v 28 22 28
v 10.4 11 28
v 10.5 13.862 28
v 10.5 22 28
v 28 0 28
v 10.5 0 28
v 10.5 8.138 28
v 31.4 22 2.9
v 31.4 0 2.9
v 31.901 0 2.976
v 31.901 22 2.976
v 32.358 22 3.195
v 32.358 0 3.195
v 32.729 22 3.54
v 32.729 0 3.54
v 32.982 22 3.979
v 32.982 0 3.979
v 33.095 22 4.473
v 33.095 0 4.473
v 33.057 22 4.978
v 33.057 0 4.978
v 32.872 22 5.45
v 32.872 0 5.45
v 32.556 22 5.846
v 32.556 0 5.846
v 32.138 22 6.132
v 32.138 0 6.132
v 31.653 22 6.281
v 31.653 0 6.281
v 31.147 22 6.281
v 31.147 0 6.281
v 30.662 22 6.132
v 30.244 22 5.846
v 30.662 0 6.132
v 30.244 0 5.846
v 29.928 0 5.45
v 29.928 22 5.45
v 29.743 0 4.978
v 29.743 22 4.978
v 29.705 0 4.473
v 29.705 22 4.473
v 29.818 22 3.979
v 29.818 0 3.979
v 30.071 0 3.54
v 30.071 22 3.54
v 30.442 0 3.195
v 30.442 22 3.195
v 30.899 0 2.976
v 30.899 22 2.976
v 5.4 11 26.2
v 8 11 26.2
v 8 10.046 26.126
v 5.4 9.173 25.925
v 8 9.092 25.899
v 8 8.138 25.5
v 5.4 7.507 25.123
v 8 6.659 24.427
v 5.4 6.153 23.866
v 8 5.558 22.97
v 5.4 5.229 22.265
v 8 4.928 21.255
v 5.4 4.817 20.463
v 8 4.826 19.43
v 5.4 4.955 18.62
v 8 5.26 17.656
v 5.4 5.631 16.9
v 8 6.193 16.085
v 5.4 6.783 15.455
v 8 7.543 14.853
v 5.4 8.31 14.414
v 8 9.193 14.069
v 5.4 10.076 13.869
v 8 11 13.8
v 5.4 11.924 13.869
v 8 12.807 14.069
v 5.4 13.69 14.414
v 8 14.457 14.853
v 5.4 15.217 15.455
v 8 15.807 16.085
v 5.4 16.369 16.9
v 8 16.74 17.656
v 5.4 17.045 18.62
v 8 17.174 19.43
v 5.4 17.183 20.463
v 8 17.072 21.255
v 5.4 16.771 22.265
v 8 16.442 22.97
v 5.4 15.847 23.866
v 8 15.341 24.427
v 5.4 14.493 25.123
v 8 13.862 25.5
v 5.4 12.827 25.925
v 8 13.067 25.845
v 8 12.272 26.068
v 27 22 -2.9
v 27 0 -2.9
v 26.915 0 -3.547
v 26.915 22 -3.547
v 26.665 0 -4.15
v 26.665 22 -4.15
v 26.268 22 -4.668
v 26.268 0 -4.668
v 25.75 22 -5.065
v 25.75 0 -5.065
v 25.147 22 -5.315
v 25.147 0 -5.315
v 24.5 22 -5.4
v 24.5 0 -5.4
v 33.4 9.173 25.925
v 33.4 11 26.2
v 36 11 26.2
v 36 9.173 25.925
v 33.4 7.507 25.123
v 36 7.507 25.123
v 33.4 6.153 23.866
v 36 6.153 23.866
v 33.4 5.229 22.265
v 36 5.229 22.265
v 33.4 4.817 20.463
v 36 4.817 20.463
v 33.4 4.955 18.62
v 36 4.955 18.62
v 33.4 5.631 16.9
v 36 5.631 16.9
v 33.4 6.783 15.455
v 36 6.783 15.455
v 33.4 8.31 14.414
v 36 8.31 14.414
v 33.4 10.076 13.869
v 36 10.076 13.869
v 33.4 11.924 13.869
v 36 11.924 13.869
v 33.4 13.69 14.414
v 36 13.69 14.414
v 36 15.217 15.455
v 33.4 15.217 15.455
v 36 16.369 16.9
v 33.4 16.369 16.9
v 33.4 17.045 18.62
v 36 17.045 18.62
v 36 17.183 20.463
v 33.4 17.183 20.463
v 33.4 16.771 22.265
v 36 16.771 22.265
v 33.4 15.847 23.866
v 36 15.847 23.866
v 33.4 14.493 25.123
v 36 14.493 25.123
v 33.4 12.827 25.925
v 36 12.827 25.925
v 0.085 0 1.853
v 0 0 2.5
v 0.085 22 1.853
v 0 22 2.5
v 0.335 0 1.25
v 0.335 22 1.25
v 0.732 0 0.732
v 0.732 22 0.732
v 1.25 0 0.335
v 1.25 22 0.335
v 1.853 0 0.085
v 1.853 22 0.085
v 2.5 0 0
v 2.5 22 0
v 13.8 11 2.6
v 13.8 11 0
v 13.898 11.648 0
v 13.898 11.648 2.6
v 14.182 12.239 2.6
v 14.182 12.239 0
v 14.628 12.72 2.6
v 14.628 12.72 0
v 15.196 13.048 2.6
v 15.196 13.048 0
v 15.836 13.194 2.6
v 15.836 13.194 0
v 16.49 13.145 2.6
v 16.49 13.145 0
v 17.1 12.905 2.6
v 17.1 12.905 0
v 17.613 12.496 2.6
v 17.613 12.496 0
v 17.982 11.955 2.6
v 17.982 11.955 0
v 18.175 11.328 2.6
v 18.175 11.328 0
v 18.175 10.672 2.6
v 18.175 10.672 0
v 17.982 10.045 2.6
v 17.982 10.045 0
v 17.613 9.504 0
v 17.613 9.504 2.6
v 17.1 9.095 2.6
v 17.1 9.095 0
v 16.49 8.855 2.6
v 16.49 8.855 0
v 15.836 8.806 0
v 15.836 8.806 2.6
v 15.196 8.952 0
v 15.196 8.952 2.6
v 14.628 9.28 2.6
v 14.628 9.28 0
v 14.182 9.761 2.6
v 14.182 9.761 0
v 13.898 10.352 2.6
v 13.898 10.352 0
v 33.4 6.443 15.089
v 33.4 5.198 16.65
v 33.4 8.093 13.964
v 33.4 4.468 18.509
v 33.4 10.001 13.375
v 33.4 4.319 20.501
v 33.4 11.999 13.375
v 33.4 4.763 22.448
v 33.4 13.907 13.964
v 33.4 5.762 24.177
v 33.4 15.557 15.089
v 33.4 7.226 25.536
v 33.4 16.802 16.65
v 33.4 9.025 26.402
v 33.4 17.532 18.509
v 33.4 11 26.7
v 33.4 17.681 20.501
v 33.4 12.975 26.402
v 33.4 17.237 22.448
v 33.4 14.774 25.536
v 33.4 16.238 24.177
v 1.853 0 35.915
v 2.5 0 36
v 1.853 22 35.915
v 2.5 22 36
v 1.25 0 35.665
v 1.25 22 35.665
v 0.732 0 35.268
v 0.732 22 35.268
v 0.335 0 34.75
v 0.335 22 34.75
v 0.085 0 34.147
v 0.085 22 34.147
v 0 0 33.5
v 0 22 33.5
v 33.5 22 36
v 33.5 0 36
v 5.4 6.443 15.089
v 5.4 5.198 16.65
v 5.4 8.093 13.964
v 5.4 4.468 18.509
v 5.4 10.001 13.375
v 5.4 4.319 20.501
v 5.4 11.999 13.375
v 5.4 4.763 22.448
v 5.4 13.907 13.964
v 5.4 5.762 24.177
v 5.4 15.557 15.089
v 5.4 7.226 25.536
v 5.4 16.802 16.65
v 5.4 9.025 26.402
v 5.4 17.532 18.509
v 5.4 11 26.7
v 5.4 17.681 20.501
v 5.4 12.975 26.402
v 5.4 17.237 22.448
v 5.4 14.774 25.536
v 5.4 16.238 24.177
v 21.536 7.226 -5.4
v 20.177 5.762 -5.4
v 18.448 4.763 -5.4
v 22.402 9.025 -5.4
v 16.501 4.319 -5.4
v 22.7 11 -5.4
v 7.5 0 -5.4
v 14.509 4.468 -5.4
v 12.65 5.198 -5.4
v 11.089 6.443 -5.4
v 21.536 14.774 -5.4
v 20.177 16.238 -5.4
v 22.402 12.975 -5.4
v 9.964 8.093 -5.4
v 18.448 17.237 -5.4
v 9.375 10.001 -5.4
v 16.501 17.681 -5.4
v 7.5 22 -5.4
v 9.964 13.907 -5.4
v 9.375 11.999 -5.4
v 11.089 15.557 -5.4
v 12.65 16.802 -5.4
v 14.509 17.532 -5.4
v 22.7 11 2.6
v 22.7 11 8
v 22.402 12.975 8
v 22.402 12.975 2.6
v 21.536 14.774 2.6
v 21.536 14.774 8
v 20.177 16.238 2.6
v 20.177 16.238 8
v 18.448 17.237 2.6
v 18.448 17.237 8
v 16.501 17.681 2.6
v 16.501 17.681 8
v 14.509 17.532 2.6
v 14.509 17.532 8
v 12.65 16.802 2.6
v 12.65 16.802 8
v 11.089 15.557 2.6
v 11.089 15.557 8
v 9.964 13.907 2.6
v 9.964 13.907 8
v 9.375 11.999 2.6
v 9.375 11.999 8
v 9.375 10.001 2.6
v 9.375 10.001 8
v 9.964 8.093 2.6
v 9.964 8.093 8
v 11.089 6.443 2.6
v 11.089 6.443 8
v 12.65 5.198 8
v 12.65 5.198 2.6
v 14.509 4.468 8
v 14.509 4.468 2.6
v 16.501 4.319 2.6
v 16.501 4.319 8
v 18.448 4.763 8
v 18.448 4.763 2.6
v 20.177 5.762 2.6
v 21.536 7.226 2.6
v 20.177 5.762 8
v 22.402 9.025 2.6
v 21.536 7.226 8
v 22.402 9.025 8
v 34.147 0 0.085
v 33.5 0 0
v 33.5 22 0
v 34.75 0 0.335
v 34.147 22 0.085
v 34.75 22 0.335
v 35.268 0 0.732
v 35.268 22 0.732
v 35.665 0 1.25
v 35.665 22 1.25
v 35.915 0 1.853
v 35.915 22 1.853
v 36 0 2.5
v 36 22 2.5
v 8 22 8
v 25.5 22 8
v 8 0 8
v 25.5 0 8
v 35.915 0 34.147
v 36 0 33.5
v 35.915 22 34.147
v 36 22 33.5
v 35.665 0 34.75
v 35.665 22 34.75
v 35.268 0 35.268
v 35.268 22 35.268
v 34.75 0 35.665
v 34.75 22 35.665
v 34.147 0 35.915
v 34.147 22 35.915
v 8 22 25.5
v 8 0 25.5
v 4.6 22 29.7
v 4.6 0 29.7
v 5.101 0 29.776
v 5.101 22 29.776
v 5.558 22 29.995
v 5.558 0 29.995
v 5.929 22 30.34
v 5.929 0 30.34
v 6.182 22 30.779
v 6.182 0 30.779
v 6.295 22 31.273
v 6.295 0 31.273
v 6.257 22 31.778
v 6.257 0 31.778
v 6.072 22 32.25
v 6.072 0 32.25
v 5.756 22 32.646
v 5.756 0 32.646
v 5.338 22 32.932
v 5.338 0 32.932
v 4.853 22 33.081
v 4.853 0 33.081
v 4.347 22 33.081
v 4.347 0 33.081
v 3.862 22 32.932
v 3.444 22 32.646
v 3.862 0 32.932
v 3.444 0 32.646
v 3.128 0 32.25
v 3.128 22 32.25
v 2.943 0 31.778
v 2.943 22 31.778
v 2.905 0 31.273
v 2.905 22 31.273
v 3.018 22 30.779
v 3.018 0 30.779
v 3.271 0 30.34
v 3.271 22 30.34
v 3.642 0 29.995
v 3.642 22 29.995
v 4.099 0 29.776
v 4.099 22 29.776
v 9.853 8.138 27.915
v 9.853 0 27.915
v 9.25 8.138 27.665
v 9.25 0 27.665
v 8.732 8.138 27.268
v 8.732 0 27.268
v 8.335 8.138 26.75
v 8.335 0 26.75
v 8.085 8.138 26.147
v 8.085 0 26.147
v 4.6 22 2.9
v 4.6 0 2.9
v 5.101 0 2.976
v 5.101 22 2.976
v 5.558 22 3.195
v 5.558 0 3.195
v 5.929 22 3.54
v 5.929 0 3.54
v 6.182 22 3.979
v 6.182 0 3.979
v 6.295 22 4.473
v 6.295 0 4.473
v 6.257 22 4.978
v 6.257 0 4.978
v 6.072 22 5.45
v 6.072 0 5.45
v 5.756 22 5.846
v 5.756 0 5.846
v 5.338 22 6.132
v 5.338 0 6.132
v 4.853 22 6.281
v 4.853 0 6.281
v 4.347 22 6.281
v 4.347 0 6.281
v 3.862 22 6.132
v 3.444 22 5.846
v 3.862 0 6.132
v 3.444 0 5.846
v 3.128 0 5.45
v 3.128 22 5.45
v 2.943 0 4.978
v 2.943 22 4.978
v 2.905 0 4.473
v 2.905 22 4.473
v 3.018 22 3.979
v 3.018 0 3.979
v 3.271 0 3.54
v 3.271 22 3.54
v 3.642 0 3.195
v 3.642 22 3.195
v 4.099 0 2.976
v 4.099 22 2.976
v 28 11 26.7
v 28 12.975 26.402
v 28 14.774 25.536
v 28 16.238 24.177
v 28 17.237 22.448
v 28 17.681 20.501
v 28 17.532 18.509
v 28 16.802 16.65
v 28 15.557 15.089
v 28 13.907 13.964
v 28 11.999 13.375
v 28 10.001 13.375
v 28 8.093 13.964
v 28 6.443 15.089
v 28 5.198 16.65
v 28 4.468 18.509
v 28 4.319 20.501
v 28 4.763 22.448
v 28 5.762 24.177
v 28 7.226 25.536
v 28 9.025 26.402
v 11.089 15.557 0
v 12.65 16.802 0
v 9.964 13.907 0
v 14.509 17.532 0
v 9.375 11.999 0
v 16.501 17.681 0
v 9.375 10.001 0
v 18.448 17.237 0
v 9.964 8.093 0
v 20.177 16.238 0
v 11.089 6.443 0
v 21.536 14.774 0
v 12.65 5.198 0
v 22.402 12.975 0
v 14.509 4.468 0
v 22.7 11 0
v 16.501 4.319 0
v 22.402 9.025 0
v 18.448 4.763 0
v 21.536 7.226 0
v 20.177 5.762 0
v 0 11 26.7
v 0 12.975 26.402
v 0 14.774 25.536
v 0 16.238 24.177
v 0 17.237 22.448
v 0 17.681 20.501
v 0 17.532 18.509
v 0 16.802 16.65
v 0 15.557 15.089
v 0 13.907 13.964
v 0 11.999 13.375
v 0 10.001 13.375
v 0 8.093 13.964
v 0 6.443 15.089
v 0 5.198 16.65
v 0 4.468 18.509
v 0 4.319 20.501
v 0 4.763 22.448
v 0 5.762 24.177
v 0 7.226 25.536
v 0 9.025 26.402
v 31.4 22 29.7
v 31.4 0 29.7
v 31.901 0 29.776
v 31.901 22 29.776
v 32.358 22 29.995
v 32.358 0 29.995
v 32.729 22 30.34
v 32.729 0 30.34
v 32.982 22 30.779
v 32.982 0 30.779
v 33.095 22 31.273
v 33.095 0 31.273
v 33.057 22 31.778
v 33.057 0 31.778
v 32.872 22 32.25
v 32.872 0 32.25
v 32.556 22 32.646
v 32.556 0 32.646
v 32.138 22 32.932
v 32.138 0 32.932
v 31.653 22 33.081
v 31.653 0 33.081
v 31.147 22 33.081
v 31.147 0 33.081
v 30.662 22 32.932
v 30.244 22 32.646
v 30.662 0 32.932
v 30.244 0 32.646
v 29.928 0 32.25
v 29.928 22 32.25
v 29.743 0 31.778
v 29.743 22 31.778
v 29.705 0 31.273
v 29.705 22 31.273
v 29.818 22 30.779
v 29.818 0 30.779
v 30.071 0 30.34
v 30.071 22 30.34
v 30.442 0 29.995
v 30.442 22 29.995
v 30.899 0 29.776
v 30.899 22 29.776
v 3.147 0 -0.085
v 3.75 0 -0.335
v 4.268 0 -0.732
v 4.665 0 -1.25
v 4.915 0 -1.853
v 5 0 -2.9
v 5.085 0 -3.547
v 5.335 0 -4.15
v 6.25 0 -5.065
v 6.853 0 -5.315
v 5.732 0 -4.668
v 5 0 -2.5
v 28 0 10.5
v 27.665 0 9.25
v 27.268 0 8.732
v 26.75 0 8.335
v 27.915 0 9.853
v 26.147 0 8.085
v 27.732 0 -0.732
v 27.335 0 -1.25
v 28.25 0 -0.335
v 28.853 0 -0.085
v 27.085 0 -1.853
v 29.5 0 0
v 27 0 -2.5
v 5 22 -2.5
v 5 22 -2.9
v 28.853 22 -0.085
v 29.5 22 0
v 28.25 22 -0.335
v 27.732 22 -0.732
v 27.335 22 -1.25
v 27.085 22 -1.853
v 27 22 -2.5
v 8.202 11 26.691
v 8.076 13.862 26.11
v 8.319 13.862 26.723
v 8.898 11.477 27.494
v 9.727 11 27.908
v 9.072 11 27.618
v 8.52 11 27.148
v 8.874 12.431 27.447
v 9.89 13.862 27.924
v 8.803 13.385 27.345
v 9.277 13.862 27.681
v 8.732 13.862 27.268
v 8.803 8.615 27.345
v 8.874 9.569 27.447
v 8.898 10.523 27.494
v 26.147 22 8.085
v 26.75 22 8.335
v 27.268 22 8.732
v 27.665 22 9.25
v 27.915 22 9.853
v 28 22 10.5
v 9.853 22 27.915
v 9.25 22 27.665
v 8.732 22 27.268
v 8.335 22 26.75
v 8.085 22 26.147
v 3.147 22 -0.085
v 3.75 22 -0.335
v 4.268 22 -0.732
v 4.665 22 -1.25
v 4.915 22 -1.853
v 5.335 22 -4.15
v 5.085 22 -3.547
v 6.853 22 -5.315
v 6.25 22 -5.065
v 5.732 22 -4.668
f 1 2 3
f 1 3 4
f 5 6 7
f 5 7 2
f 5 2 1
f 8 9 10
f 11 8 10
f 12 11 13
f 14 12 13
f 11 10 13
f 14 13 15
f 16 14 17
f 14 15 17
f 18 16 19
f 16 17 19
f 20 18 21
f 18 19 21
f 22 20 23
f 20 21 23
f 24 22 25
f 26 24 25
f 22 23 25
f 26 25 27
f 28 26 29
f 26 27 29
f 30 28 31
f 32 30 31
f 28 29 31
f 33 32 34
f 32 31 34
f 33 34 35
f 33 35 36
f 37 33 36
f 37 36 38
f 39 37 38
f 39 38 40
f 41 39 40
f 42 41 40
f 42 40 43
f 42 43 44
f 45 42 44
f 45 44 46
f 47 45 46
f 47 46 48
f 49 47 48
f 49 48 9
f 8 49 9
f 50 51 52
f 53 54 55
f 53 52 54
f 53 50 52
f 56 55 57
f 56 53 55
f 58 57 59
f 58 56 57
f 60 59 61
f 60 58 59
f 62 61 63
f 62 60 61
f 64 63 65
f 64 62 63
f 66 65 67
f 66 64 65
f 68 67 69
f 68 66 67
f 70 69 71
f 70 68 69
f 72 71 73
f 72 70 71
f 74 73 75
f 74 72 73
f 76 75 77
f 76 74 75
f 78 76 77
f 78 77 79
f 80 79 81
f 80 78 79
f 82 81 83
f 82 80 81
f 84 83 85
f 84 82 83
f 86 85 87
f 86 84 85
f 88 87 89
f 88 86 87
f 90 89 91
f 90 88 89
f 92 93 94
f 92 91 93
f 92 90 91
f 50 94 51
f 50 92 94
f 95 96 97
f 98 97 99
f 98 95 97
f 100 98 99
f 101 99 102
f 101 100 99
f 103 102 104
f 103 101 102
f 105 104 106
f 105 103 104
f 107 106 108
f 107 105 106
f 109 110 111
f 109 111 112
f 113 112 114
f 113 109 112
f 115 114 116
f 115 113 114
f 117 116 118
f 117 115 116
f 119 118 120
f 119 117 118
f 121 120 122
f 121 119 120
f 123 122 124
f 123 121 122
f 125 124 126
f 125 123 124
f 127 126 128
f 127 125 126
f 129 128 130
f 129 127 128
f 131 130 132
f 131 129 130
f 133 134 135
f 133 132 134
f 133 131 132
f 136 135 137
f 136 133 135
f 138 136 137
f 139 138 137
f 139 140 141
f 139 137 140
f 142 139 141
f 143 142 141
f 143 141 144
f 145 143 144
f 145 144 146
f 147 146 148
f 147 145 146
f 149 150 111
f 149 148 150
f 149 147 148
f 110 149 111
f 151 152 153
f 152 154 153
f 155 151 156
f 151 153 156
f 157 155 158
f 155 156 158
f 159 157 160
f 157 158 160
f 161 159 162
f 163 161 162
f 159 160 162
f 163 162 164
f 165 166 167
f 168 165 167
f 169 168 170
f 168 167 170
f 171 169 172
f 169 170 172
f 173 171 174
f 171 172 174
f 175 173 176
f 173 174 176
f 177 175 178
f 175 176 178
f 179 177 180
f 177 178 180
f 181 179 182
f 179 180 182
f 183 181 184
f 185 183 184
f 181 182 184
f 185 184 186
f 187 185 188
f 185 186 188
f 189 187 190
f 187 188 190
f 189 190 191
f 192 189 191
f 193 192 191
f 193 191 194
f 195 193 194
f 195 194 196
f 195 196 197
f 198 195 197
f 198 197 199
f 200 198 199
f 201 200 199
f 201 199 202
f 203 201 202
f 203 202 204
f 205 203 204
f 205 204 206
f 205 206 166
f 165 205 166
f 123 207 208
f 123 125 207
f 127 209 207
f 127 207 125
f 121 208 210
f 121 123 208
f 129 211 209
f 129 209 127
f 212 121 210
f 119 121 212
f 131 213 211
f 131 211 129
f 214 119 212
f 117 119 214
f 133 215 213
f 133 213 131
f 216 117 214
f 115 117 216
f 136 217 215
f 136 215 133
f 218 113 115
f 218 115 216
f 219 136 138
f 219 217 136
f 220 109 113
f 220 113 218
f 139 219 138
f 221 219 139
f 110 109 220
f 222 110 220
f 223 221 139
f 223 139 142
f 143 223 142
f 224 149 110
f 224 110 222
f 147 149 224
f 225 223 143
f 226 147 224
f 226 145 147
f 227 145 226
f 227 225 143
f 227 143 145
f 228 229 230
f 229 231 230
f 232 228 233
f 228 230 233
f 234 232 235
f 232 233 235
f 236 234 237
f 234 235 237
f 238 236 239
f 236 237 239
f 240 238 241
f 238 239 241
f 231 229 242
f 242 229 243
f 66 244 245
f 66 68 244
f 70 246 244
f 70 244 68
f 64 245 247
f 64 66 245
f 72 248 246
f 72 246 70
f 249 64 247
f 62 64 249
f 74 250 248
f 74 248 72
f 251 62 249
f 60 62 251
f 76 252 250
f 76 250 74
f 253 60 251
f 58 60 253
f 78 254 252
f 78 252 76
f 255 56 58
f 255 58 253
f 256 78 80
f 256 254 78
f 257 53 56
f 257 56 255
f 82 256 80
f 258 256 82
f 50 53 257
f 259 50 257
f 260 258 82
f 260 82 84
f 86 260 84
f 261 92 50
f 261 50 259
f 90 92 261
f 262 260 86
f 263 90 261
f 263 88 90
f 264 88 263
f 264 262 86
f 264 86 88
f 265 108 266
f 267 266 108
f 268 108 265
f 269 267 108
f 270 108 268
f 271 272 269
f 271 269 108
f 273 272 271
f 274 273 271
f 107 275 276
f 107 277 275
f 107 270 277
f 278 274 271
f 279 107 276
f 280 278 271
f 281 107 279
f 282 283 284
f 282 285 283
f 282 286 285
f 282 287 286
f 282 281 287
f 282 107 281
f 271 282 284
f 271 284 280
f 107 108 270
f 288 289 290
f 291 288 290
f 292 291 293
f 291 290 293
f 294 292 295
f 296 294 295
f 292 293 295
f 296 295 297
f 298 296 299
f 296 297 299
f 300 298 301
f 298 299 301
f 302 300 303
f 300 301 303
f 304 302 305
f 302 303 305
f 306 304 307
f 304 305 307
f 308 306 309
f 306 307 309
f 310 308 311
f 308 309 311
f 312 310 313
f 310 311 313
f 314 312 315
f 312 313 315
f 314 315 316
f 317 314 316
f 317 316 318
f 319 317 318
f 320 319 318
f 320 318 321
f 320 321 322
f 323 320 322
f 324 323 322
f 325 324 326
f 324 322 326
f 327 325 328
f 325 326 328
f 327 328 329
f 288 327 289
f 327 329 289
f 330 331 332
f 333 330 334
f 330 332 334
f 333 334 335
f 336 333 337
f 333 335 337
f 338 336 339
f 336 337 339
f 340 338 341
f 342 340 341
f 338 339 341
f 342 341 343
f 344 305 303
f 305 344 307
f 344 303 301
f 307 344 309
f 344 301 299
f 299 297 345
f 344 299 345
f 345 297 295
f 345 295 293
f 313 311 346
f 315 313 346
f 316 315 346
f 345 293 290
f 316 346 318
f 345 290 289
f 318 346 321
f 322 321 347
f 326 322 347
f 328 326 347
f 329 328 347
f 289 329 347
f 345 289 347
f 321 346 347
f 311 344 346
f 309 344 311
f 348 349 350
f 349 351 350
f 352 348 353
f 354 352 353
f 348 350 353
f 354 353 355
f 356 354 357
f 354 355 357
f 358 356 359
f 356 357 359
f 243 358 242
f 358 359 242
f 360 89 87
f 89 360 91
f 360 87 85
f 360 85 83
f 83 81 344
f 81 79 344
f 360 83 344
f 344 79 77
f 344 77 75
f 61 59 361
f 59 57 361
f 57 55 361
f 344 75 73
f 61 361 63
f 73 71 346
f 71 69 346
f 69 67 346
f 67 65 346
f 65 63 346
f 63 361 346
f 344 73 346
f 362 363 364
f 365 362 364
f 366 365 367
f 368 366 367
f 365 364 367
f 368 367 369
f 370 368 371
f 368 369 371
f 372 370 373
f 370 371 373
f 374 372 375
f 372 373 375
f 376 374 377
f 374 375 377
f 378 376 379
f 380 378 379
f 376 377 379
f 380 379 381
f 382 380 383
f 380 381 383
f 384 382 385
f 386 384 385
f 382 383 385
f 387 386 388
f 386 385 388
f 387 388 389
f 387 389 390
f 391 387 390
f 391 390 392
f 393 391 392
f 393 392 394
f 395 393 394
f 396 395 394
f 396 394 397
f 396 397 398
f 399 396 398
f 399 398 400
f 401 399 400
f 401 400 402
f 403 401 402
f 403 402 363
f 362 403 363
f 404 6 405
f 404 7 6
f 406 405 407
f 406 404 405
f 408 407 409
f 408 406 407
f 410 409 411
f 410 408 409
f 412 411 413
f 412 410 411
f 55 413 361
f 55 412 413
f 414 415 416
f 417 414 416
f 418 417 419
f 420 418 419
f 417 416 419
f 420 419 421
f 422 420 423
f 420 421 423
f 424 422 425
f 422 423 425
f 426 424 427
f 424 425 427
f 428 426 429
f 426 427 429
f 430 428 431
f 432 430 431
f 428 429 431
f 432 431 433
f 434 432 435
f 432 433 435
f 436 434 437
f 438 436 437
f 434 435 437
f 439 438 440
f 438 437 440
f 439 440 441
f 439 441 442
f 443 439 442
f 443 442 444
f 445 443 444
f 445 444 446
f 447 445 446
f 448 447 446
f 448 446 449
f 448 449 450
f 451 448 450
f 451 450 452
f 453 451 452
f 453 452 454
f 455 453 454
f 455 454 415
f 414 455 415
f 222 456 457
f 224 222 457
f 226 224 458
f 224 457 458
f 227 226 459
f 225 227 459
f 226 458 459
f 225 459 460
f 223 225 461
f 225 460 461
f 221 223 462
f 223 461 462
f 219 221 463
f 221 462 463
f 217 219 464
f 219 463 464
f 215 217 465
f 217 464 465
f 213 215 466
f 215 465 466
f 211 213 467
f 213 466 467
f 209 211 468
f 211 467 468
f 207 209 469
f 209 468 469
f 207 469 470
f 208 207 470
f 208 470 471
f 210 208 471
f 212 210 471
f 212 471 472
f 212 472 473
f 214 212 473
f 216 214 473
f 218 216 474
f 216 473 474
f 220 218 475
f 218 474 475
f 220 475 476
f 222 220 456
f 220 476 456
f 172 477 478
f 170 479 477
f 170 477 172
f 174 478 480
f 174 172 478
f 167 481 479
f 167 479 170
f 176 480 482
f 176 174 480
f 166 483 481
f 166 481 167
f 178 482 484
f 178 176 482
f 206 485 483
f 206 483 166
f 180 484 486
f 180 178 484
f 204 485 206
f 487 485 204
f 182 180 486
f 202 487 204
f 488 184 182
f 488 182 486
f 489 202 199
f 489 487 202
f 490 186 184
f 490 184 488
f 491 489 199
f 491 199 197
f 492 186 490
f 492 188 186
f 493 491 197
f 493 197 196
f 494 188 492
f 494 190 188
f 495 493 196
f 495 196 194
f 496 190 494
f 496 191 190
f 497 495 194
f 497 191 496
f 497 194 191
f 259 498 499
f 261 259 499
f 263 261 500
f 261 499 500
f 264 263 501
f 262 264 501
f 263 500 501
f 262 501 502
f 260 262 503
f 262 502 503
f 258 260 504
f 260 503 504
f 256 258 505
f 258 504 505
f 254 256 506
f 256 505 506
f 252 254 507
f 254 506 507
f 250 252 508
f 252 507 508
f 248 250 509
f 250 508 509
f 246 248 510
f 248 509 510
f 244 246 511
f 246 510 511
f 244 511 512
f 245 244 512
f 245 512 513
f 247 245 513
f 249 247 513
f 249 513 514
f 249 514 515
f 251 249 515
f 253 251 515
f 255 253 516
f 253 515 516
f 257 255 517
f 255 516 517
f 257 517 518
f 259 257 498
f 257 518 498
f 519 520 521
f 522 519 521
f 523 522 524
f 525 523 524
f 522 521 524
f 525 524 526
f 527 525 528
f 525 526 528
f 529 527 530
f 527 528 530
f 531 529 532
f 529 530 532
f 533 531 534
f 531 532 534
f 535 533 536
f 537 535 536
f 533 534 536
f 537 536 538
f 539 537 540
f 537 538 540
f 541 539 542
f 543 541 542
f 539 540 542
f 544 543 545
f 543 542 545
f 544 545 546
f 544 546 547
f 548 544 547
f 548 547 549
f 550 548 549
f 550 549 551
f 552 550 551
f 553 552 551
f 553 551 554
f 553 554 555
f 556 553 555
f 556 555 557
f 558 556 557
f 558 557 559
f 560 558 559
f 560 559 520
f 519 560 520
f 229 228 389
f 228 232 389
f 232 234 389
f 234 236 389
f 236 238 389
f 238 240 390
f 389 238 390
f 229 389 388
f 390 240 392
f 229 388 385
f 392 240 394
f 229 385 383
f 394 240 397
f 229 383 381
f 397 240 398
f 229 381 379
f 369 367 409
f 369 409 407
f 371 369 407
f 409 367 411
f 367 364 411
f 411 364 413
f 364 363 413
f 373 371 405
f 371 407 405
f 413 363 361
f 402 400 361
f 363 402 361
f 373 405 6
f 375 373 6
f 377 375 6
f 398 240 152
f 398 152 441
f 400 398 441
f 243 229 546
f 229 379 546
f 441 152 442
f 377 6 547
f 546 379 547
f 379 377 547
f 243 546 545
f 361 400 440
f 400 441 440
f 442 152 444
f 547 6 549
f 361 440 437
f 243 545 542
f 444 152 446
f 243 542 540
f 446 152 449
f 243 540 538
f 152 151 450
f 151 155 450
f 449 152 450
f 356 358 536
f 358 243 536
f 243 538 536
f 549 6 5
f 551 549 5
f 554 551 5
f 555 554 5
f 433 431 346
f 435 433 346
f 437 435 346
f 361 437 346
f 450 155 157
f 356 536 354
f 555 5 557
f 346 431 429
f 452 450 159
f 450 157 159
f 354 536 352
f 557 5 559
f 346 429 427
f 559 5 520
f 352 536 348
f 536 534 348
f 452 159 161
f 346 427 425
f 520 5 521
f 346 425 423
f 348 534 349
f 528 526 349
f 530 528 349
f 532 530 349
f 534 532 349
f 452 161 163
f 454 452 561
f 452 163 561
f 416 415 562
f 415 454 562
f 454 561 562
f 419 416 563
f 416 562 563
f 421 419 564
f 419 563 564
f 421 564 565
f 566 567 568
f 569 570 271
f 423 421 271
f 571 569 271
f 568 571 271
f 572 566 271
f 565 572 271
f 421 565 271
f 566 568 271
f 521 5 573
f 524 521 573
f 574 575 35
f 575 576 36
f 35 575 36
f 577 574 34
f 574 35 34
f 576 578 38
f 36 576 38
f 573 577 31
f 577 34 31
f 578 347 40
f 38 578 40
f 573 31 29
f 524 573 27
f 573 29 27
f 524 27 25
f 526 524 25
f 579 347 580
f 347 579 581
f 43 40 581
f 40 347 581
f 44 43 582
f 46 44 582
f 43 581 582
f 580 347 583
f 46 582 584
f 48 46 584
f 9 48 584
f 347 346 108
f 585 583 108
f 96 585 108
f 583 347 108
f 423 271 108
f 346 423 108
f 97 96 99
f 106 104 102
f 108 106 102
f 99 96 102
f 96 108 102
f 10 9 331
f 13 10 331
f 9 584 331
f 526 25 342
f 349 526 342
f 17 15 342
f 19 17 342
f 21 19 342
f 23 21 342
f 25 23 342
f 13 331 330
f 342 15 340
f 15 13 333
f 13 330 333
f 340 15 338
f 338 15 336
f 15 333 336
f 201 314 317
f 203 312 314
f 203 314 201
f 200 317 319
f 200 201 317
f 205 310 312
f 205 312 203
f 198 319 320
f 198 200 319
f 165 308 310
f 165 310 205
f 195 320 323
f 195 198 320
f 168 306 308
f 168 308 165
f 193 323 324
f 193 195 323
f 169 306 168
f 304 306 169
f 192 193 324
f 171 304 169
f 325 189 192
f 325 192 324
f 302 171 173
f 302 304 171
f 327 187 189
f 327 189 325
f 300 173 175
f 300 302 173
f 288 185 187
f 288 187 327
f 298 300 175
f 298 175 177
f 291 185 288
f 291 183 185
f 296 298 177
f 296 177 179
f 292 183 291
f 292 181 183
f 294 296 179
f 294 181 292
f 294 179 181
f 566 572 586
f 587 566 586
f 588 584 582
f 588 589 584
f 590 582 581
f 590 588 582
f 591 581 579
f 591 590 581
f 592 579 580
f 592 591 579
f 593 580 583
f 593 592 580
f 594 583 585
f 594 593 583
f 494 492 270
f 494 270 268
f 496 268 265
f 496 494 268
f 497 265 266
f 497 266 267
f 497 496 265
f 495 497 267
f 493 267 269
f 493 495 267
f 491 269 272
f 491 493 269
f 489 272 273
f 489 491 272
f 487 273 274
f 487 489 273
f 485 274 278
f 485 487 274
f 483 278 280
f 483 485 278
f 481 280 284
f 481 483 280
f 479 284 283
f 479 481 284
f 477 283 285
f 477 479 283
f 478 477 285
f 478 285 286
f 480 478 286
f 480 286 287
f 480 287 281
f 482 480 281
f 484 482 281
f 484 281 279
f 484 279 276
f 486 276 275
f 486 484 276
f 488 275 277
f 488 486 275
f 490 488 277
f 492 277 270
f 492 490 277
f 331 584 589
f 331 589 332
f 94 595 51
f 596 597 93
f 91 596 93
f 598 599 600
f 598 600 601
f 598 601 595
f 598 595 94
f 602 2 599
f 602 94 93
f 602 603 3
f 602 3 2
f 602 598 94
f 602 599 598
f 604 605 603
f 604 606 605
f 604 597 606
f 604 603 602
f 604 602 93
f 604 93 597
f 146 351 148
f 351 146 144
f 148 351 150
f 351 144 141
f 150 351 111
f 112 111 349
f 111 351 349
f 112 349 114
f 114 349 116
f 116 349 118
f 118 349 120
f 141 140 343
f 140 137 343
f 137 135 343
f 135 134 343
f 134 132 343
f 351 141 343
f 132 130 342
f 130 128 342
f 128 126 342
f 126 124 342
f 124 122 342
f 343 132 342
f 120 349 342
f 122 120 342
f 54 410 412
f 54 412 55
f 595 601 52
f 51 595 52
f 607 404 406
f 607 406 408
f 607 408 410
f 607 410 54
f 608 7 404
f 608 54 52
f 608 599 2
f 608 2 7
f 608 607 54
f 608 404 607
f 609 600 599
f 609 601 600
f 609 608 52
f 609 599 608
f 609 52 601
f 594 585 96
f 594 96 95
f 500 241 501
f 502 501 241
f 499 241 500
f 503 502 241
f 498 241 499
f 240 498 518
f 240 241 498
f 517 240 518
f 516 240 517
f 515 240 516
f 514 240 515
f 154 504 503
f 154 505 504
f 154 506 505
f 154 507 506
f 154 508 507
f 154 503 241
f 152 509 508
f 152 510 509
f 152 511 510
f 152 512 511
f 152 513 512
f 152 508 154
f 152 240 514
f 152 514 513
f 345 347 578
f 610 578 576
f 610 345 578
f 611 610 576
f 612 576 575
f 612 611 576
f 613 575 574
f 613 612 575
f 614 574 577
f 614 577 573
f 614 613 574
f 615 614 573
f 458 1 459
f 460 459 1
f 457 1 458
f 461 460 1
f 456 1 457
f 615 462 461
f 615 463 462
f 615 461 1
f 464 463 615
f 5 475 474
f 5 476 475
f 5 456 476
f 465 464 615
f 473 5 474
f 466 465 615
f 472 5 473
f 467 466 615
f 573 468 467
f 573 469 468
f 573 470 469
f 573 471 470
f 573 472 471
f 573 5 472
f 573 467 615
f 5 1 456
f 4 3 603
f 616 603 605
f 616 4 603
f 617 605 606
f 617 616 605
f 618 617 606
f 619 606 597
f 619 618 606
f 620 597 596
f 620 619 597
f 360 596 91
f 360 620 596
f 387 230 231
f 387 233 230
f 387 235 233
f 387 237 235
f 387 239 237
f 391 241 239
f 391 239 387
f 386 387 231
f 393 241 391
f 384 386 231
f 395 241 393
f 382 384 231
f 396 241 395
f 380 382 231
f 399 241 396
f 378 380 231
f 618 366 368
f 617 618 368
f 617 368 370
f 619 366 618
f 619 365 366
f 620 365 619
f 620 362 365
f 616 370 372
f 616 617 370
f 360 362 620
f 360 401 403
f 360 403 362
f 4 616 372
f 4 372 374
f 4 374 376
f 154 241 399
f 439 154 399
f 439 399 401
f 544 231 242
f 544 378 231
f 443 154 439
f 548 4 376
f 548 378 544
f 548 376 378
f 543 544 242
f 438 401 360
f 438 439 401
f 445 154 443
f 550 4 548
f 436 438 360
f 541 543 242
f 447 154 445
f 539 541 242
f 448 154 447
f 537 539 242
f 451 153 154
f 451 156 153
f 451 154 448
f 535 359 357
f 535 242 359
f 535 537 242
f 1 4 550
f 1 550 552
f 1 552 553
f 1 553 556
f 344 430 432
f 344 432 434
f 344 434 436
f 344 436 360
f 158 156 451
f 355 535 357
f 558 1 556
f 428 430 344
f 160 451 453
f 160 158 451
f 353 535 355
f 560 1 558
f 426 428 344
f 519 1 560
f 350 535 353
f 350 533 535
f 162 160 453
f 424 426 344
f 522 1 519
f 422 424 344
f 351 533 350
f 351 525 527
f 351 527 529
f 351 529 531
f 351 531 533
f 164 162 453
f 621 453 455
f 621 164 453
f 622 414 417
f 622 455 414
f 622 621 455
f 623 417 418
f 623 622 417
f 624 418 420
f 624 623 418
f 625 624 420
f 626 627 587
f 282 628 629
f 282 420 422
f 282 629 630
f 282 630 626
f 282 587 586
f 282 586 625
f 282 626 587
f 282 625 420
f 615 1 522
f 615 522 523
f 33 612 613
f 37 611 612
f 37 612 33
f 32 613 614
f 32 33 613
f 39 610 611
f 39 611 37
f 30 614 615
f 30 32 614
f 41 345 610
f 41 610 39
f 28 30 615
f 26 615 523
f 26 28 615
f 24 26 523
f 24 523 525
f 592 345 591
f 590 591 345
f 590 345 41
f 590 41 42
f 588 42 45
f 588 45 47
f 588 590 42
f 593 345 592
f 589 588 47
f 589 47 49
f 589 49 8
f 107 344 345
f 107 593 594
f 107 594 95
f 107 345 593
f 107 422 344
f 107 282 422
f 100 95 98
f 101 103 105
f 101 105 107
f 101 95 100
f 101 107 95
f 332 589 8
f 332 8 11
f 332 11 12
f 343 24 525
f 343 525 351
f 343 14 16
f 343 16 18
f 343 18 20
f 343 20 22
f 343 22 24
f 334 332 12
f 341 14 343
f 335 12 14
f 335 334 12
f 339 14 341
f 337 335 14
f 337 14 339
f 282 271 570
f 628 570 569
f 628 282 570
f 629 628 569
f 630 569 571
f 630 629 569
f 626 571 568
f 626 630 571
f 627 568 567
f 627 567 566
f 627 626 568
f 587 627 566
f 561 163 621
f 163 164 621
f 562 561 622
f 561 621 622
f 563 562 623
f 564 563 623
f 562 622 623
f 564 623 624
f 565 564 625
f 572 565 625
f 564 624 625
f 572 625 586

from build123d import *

# Parameters (mm, degrees)
SKETCH3_W               = 36
SKETCH3_H               = 36
SKETCH3_W_2             = 20
SKETCH3_H_2             = 20
BOSS_EXTRUDE1_DEPTH     = 22
CUT_EXTRUDE1_REACH      = 57.462
SKETCH4_R               = 2.2
CUT_EXTRUDE2_DEPTH      = 56.461698495
CUT_EXTRUDE2_DEPTH_BACK = 56.461698495
SKETCH5_R               = 6.2
SKETCH6_W               = 22
SKETCH6_H               = 22
SKETCH6_R               = 6.7
BOSS_EXTRUDE2_DEPTH     = 5.4
SKETCH7_R               = 6.7
CUT_EXTRUDE3_DEPTH      = 5.4
SKETCH8_R               = 6.7
CUT_EXTRUDE4_DEPTH      = 5.4
SKETCH9_R               = 6.7
CUT_EXTRUDE5_DEPTH      = 5.4
FILLET2_R               = 2.5
FILLET3_R               = 2.5
FILLET4_R               = 2.5
SKETCH10_R              = 1.7
CUT_EXTRUDE6_DEPTH      = 56.461698535


with BuildPart() as part:
    # Sketch3 → Boss-Extrude1 (new body)
    with BuildSketch(Plane(origin=(0, 0, 0), x_dir=(1, 0, 0), z_dir=(0, 1, 0))):
        with Locations((18, -18)):
            Rectangle(SKETCH3_W, SKETCH3_H)
        with Locations((18, -18)):
            Rectangle(SKETCH3_W_2, SKETCH3_H_2, mode=Mode.SUBTRACT)
    extrude(amount=BOSS_EXTRUDE1_DEPTH)

    # Sketch4 → Cut-Extrude1 (cut, up to next)
    with BuildSketch(Plane(origin=(0, 0, 0), x_dir=(-1, 0, 0), z_dir=(0, 0, -1)), mode=Mode.PRIVATE) as cut_extrude1_sk1:
        with Locations((-16, 11)):
            Circle(SKETCH4_R)
    cut_extrude1_tool1 = extrude(cut_extrude1_sk1.sketch, amount=-CUT_EXTRUDE1_REACH, mode=Mode.PRIVATE) & part.part
    add(cut_extrude1_tool1.solids().sort_by_distance((16, 11, 0))[0], mode=Mode.SUBTRACT)

    # Sketch5 → Cut-Extrude2 (cut, two sides: drawn at the far end of the back side and taken through both)
    with BuildSketch(Plane(origin=(36, 0, 0), x_dir=(0, 0, -1), z_dir=(1, 0, 0)).offset(-CUT_EXTRUDE2_DEPTH_BACK)):
        with Locations(Location((-20, 11, 0), (0, 0, 180))):
            Circle(SKETCH5_R)
    extrude(amount=CUT_EXTRUDE2_DEPTH + CUT_EXTRUDE2_DEPTH_BACK, mode=Mode.SUBTRACT)

    # Sketch6 → Boss-Extrude2 (add)
    with BuildSketch(Plane(origin=(0, 0, 0), x_dir=(-1, 0, 0), z_dir=(0, 0, -1))):
        with Locations((-16, 11)):
            Rectangle(SKETCH6_W, SKETCH6_H)
        with Locations(Location((-16, 11, 0), (0, 0, 180))):
            Circle(SKETCH6_R, mode=Mode.SUBTRACT)
    extrude(amount=BOSS_EXTRUDE2_DEPTH)

    # Sketch7 → Cut-Extrude3 (cut)
    with BuildSketch(Plane.XY.offset(8)):
        with Locations((16, 11)):
            Circle(SKETCH7_R)
    extrude(amount=-CUT_EXTRUDE3_DEPTH, mode=Mode.SUBTRACT)

    # Sketch8 → Cut-Extrude4 (cut)
    with BuildSketch(Plane.ZY.offset(-28)):
        with Locations((20, 11)):
            Circle(SKETCH8_R)
    extrude(amount=-CUT_EXTRUDE4_DEPTH, mode=Mode.SUBTRACT)

    # Sketch9 → Cut-Extrude5 (cut)
    with BuildSketch(Plane.ZY):
        with Locations((20, 11)):
            Circle(SKETCH9_R)
    extrude(amount=-CUT_EXTRUDE5_DEPTH, mode=Mode.SUBTRACT)

    # Fillet2
    fillet2_edges = [part.edges().sort_by_distance(p)[0] for p in [
        (5, 11, -5.4),
        (27, 11, -5.4),
        (5, 11, 0),
        (27, 11, 0),
    ]]
    fillet(fillet2_edges, radius=FILLET2_R)

    # Fillet3
    fillet3_edges = [part.edges().sort_by_distance(p)[0] for p in [
        (8, 11, 28),
        (28, 11, 8),
    ]]
    fillet(fillet3_edges, radius=FILLET3_R)

    # Fillet4
    fillet4_edges = [part.edges().sort_by_distance(p)[0] for p in [
        (0, 11, 0),
        (36, 11, 0),
        (36, 11, 36),
        (0, 11, 36),
    ]]
    fillet(fillet4_edges, radius=FILLET4_R - 0.0001)  # a hair under: the kernel refuses the full size

    # Sketch10 → Cut-Extrude6 (cut, through all)
    with BuildSketch(Plane(origin=(0, 0, 0), x_dir=(-1, 0, 0), z_dir=(0, -1, 0))):
        with Locations(Location((-31.4, -4.6, 0), (0, 0, 90))):
            Circle(SKETCH10_R)
        with Locations(Location((-4.6, -4.6, 0), (0, 0, 90))):
            Circle(SKETCH10_R)
        with Locations(Location((-4.6, -31.4, 0), (0, 0, 90))):
            Circle(SKETCH10_R)
        with Locations(Location((-31.4, -31.4, 0), (0, 0, 90))):
            Circle(SKETCH10_R)
    extrude(amount=-CUT_EXTRUDE6_DEPTH, mode=Mode.SUBTRACT)


solid = part.part
